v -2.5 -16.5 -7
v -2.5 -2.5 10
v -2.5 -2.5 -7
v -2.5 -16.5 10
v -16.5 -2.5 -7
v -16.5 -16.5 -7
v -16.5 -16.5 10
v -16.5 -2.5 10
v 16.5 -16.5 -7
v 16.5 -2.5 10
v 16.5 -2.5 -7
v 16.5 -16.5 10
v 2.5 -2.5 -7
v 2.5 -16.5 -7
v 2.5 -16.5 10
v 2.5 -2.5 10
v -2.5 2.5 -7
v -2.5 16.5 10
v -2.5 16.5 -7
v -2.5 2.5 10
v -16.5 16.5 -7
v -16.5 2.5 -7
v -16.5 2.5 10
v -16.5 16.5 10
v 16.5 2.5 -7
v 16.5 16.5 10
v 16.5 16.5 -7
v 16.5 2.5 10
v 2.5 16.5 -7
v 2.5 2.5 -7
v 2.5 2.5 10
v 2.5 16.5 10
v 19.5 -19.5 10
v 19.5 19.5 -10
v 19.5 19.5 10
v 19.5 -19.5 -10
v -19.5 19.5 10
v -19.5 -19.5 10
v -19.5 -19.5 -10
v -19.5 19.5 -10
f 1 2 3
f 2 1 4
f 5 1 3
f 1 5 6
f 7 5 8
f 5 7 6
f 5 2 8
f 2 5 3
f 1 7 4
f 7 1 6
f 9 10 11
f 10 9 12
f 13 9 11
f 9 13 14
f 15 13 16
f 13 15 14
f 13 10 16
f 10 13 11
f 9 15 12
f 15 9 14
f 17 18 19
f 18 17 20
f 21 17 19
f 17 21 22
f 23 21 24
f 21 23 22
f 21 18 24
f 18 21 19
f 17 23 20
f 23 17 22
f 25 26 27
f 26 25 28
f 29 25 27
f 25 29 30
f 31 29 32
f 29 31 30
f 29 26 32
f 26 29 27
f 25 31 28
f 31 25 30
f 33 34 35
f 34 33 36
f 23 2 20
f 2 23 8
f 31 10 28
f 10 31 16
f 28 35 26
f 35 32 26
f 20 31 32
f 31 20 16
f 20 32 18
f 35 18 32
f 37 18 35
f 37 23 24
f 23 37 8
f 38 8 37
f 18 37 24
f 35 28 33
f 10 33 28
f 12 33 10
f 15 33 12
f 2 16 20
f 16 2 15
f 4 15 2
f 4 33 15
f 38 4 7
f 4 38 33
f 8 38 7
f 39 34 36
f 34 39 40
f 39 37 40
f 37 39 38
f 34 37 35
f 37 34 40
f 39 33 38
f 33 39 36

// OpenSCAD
$fn = 32;

// ----------------------------------------------------------------------
// Pocket plate 39 x 39 x 20
// 2 x 2 pockets 14 mm square, 17 mm deep
// ----------------------------------------------------------------------

// --- parameters (mm) ---
thickness = 20;  // plate thickness
seat_tol = 0.1;  // tolerance at the seating features
free_tol = 0.3;  // general tolerance on the free sizes
floor_t = 3;     // material left under each pocket
pocket = 14;     // pocket side length
pitch_x = 19;    // pocket pitch along X
pitch_y = 19;    // pocket pitch along Y
cols = 2;        // pockets per row
rows = 2;        // rows of pockets

// --- derived feature positions (mm) ---
depth = thickness - floor_t;        // = 17   pocket depth, down to the floor
span_x = (cols - 1) * pitch_x;      // = 19   distance between outer pockets
span_y = (rows - 1) * pitch_y;      // = 19   distance between outer pocket rows
origin_x = -span_x / 2;             // = -9.5   X of the first pocket
origin_y = -span_y / 2;             // = -9.5   Y of the first pocket
plate = [span_x + pocket + 6, span_y + pocket + 6, thickness];  // = [39, 39, 20]   overall size: pockets plus 3 mm of wall on each side
feature_centers = [
  [origin_x + 0 * pitch_x, origin_y + 0 * pitch_y],
  [origin_x + 1 * pitch_x, origin_y + 0 * pitch_y],
  [origin_x + 0 * pitch_x, origin_y + 1 * pitch_y],
  [origin_x + 1 * pitch_x, origin_y + 1 * pitch_y]
];   // pocket centres, used verbatim by the cutter loop

// plate outline, then one pocket per centre in feature_centers
difference() {
  cube(plate, center = true);
  for (centre = feature_centers)
    translate([centre[0] - pocket / 2, centre[1] - pocket / 2, plate[2] / 2 - depth])
      cube([pocket, pocket, depth + 1]);  // centred on the declared pocket centre
}
